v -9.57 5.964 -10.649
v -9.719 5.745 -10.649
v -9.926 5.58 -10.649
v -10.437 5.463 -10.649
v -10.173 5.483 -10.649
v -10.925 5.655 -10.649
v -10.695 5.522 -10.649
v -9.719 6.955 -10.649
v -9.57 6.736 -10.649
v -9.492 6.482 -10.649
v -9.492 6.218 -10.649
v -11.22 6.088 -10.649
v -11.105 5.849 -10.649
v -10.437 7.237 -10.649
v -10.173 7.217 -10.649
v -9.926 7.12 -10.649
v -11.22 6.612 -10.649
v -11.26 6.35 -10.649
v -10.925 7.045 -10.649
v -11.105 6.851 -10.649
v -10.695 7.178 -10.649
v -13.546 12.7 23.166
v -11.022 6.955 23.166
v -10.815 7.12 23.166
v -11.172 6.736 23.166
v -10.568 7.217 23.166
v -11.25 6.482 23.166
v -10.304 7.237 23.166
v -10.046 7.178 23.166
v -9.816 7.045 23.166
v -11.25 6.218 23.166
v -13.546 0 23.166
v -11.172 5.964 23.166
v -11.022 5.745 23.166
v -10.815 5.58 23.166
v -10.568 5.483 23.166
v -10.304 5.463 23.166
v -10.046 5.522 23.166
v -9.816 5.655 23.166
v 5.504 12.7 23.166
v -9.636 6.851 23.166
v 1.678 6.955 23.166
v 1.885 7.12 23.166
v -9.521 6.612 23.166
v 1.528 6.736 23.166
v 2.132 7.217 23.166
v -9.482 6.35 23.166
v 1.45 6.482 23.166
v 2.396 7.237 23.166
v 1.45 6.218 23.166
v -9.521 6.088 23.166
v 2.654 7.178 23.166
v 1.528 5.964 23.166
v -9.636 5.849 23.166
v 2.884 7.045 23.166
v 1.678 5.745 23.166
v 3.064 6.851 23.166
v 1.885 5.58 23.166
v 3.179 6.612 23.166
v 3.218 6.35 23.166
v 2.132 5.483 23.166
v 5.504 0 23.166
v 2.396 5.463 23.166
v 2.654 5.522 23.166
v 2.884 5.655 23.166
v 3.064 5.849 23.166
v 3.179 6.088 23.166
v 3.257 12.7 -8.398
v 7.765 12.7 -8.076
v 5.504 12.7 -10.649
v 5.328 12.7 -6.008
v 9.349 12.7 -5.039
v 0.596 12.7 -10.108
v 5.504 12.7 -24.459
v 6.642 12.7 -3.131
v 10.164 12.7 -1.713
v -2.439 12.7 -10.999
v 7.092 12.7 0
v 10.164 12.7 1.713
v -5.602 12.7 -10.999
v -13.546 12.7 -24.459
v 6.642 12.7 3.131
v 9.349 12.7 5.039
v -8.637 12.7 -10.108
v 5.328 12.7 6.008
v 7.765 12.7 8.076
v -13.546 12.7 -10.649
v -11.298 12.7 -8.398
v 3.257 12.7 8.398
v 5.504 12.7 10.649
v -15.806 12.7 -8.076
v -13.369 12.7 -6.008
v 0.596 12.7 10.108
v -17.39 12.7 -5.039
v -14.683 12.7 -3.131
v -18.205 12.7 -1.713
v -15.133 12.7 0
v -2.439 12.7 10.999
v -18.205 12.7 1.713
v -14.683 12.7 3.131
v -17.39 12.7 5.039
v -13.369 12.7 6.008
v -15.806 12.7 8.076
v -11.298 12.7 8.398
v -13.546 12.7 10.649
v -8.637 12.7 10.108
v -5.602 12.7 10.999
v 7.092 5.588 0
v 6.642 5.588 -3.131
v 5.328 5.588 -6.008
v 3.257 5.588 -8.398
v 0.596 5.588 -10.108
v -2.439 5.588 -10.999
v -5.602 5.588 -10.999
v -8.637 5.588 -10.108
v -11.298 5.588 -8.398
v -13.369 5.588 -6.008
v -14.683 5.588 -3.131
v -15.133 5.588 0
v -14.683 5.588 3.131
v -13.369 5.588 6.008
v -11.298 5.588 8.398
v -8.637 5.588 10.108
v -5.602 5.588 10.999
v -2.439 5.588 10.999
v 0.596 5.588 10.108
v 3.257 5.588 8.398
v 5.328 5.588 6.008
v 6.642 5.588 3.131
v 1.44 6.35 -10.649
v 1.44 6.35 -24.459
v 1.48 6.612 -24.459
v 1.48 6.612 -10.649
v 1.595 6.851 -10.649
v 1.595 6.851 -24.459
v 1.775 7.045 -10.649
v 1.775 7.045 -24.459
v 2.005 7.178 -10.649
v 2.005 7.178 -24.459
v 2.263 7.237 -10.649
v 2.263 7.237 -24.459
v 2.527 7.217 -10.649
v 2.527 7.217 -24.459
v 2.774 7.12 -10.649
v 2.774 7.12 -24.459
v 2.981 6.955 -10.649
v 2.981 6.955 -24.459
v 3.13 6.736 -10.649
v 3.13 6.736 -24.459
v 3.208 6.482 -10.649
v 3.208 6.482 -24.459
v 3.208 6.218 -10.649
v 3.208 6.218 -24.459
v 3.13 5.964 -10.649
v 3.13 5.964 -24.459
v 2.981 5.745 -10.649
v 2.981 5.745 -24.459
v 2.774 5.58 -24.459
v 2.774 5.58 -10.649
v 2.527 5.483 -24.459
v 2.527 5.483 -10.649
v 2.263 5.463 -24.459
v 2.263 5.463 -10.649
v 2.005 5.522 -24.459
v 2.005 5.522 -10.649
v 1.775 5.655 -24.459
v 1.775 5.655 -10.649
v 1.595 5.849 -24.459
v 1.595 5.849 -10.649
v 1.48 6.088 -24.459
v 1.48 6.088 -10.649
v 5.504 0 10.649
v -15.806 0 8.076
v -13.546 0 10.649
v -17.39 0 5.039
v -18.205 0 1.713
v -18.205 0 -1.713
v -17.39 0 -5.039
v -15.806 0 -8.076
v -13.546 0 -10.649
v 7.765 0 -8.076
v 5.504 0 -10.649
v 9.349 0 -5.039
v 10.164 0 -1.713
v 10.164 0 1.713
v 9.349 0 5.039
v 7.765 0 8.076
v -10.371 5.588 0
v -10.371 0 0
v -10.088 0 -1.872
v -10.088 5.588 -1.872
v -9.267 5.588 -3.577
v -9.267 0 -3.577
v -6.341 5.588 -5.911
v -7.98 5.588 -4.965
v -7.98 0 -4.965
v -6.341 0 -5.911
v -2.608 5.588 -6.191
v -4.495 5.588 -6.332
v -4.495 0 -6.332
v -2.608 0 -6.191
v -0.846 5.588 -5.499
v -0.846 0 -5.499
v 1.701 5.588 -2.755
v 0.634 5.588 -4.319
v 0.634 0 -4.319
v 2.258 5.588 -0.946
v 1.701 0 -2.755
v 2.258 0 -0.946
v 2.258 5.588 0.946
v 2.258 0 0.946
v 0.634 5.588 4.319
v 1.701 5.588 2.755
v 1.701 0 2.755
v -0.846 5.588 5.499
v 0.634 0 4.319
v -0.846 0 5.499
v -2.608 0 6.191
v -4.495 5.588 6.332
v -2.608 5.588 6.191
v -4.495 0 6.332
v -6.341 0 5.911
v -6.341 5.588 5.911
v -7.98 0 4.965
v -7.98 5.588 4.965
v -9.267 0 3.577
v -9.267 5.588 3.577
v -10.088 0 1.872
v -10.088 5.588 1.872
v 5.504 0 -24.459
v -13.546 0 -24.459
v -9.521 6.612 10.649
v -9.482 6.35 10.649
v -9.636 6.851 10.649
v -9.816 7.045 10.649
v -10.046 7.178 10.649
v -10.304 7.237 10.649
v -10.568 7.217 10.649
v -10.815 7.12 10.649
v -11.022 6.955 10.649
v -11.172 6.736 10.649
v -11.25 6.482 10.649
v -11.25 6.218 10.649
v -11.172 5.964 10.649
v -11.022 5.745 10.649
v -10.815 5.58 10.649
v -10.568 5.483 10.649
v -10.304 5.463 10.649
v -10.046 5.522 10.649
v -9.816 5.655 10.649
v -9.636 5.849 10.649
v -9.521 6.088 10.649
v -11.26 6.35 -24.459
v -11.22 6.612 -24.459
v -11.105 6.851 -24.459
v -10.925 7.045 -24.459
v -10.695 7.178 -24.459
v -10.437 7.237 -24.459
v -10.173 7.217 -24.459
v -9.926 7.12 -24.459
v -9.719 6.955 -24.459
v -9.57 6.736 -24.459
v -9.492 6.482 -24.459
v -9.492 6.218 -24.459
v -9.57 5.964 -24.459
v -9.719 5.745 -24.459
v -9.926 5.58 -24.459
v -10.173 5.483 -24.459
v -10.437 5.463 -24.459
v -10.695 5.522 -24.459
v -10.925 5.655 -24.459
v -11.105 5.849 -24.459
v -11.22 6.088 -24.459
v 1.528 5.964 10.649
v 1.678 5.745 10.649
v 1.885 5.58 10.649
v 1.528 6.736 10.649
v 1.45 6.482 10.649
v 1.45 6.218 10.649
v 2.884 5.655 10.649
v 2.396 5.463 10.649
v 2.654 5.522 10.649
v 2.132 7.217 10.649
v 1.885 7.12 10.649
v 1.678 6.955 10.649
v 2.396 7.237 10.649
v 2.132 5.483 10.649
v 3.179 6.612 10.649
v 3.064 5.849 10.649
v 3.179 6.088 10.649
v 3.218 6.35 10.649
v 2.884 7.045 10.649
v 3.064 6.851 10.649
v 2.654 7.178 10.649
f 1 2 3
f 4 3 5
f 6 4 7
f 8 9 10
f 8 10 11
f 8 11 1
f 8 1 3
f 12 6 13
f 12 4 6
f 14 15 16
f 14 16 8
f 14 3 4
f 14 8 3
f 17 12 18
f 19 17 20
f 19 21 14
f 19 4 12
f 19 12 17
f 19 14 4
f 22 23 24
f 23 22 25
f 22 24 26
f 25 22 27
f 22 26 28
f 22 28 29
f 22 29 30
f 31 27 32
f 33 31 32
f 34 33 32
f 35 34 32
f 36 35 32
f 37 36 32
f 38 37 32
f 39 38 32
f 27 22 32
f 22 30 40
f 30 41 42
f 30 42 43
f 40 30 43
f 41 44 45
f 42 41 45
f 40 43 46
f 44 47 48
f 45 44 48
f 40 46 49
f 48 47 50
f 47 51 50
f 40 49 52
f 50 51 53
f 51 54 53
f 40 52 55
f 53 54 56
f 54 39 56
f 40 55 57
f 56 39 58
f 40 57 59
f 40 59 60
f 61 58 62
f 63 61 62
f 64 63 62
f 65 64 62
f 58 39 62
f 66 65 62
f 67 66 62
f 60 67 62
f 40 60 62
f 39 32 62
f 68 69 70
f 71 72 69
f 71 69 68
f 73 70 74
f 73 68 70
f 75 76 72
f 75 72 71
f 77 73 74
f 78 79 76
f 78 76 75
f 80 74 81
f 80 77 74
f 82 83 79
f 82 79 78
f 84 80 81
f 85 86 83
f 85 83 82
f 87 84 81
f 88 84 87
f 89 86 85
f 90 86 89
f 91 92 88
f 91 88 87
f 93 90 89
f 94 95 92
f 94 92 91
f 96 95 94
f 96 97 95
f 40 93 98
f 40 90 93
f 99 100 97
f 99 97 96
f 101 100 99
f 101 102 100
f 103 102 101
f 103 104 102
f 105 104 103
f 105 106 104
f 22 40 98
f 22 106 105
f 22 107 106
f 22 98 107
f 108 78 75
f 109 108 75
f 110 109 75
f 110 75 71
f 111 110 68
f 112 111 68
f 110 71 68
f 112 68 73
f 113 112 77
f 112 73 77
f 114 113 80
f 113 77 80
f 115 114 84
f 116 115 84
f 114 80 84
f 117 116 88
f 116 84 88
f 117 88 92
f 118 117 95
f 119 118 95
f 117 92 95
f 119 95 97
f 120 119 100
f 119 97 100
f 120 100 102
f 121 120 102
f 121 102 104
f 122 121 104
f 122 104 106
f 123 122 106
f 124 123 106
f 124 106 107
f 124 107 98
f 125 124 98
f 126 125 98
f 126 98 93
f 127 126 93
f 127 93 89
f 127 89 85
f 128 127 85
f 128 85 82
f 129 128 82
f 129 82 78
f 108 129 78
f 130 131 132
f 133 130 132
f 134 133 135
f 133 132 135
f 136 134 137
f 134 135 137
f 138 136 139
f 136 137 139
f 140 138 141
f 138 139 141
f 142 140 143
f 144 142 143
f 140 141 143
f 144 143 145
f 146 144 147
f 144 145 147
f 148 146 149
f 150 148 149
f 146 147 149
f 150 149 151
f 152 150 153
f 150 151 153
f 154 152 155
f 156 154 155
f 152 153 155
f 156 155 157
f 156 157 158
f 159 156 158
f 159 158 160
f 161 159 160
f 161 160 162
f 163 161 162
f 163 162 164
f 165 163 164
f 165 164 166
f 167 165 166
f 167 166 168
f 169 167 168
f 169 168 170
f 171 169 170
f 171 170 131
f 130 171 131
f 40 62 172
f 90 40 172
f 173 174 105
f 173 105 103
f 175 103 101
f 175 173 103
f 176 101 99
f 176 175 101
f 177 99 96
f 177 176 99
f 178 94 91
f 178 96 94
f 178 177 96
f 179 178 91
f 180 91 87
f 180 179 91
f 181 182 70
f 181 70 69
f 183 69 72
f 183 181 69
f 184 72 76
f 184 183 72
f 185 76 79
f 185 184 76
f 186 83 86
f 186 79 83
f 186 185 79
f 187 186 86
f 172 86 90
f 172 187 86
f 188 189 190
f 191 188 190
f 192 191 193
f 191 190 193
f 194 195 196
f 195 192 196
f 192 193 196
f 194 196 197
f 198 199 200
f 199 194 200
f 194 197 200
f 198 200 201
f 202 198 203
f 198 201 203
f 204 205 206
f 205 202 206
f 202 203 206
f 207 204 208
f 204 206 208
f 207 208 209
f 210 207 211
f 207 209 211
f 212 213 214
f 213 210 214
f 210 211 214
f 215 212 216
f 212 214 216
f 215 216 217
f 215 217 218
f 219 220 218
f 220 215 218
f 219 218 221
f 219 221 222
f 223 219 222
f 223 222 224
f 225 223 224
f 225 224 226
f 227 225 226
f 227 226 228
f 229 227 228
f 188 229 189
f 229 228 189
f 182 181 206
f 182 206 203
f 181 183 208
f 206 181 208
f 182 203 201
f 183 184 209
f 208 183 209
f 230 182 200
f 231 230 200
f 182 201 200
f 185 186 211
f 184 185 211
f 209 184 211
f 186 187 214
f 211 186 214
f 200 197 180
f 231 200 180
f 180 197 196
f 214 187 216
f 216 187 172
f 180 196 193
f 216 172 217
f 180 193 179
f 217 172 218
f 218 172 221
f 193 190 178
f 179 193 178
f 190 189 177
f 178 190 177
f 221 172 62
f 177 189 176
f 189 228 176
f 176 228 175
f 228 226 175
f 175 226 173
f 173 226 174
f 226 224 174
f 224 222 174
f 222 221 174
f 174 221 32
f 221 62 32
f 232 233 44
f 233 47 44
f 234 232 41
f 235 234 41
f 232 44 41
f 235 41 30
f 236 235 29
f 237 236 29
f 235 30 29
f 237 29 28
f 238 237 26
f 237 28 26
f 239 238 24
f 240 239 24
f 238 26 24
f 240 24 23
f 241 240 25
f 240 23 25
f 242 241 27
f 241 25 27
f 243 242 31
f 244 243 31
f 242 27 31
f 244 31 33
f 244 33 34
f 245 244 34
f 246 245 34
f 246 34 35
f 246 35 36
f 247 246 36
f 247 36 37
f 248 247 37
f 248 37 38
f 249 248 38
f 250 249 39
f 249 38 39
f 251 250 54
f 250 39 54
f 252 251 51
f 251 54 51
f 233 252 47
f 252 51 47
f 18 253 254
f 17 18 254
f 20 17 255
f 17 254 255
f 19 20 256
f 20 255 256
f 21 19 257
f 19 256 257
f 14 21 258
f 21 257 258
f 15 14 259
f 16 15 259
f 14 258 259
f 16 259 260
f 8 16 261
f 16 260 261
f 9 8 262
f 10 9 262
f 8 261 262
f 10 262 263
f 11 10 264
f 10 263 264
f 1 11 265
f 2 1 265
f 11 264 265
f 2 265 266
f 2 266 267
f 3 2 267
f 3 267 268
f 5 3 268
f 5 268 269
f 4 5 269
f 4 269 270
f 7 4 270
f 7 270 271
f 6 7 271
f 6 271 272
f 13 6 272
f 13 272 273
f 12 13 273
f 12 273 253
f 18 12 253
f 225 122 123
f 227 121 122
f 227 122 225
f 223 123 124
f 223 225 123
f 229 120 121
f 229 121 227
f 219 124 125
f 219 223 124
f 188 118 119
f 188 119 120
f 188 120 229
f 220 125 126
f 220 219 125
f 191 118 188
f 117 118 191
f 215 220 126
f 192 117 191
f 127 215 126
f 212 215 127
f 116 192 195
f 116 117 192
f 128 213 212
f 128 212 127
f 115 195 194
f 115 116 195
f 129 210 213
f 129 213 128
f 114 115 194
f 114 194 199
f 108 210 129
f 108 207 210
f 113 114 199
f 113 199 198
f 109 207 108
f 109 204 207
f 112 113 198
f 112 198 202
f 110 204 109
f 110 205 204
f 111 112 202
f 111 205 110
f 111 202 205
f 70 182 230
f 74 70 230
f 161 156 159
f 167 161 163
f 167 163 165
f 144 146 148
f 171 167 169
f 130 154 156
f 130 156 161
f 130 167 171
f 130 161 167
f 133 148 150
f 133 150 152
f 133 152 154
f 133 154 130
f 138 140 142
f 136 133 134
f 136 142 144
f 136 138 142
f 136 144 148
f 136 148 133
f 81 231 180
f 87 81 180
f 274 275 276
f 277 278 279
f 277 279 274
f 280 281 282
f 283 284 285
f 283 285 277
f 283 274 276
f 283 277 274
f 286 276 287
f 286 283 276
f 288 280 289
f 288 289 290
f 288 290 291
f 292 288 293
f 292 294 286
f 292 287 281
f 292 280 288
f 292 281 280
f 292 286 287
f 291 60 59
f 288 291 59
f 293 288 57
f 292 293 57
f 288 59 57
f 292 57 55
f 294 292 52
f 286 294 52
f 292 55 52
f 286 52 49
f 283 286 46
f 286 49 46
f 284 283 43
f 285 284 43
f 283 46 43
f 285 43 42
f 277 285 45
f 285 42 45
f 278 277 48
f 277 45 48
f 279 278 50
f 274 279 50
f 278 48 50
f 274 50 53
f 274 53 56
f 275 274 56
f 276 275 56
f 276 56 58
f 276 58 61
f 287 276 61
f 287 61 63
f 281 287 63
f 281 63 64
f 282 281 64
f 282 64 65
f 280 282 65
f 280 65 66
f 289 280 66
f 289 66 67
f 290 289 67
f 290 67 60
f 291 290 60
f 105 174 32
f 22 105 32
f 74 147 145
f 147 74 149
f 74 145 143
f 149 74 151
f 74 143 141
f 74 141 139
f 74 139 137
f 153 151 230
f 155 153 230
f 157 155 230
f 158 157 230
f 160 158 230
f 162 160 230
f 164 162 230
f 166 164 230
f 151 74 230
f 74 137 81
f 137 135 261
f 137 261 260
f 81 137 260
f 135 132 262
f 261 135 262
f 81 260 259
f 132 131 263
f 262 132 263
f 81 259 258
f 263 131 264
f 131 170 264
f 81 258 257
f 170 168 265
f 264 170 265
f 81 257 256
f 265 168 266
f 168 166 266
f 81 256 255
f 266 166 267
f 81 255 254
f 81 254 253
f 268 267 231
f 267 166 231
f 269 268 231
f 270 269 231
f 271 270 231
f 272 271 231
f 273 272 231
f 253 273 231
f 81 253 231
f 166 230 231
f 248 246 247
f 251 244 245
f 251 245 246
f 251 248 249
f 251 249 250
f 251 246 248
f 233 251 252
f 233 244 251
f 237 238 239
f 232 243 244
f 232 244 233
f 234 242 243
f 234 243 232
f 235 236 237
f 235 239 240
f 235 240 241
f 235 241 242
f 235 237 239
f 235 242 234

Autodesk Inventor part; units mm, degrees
ref_plane "YZ Plane" through (0, 0, 0) normal (1, 0, 0) x (0, 1, 0)
ref_plane "XZ Plane" through (0, 0, 0) normal (0, 1, 0) x (-1, 0, 0)
ref_plane "XY Plane" through (0, 0, 0) normal (0, 0, 1) x (1, 0, 0)
sketch "Sketch1" plane through (0, 0, 0) normal (0, 1, 0) x (-1, 0, 0)
  line L0 (13.5456, 23.1663) -> (-5.5044, 23.1663)
  line L1 (-5.5044, -24.4587) -> (13.5456, -24.4587)
  line L2 (-5.5044, 23.1663) -> (-5.5044, 10.6493)
  line L3 (-5.5044, -10.6493) -> (-5.5044, -24.4587)
  line L4 (13.5456, -24.4587) -> (13.5456, -10.6493)
  line L5 (13.5456, 10.6493) -> (13.5456, 23.1663)
  circle A0 centre (4.0206, 0) radius 6.35
  arc A1 (13.5456, -10.6493) -> (13.5456, 10.6493) centre (4.0206, 0) ccw
  arc A2 (-5.5044, 10.6493) -> (-5.5044, -10.6493) centre (4.0206, 0) ccw
  point P0 (0, 0)
  dimension "d0" = 47.625
  dimension "d1" = 19.05
  dimension "d3" = 12.7
extrude "Extrusion1" add sketch "Sketch1" along normal blind 12.7
sketch "Sketch2" plane through (0, 12.7, 0) normal (0, 1, 0) x (1, 0, 0)
  circle A0 centre (-4.0206, 0) radius 6.35 projected
  circle A1 centre (-4.0206, 0) radius 11.1125
  point P0 (0, 0)
  dimension "d7" = 22.225
extrude "Extrusion2" cut sketch "Sketch2" against normal blind 7.112
sketch "Sketch3" plane through (-13.5456, 0, 23.1663) normal (0, 0, 1) x (1, 0, 0)
  line L0 (0, 0) -> (0, 12.7) projected
  line L1 (19.05, 0) -> (19.05, 12.7) projected
  circle A0 centre (3.175, 6.35) radius 0.889
  circle A1 centre (15.875, 6.35) radius 0.889
  point P0 (13.5456, 0)
  dimension "d10" = 3.175
  dimension "d11" = 3.175
  dimension "d12" = 1.778
  dimension "d13" = 1.778
extrude "Extrusion3" cut sketch "Sketch3" against normal up to surface (12.5171 mm away)
sketch "Sketch4" plane through (5.5044, 0, -24.4587) normal (0, 0, -1) x (-1, 0, 0)
  circle A0 centre (3.175, 6.35) radius 0.889 projected
  circle A1 centre (15.875, 6.35) radius 0.889 projected
  point P0 (5.5044, 0)
extrude "Extrusion4" cut sketch "Sketch4" against normal up to surface (13.8094 mm away)
properties part number "top_anchor"
